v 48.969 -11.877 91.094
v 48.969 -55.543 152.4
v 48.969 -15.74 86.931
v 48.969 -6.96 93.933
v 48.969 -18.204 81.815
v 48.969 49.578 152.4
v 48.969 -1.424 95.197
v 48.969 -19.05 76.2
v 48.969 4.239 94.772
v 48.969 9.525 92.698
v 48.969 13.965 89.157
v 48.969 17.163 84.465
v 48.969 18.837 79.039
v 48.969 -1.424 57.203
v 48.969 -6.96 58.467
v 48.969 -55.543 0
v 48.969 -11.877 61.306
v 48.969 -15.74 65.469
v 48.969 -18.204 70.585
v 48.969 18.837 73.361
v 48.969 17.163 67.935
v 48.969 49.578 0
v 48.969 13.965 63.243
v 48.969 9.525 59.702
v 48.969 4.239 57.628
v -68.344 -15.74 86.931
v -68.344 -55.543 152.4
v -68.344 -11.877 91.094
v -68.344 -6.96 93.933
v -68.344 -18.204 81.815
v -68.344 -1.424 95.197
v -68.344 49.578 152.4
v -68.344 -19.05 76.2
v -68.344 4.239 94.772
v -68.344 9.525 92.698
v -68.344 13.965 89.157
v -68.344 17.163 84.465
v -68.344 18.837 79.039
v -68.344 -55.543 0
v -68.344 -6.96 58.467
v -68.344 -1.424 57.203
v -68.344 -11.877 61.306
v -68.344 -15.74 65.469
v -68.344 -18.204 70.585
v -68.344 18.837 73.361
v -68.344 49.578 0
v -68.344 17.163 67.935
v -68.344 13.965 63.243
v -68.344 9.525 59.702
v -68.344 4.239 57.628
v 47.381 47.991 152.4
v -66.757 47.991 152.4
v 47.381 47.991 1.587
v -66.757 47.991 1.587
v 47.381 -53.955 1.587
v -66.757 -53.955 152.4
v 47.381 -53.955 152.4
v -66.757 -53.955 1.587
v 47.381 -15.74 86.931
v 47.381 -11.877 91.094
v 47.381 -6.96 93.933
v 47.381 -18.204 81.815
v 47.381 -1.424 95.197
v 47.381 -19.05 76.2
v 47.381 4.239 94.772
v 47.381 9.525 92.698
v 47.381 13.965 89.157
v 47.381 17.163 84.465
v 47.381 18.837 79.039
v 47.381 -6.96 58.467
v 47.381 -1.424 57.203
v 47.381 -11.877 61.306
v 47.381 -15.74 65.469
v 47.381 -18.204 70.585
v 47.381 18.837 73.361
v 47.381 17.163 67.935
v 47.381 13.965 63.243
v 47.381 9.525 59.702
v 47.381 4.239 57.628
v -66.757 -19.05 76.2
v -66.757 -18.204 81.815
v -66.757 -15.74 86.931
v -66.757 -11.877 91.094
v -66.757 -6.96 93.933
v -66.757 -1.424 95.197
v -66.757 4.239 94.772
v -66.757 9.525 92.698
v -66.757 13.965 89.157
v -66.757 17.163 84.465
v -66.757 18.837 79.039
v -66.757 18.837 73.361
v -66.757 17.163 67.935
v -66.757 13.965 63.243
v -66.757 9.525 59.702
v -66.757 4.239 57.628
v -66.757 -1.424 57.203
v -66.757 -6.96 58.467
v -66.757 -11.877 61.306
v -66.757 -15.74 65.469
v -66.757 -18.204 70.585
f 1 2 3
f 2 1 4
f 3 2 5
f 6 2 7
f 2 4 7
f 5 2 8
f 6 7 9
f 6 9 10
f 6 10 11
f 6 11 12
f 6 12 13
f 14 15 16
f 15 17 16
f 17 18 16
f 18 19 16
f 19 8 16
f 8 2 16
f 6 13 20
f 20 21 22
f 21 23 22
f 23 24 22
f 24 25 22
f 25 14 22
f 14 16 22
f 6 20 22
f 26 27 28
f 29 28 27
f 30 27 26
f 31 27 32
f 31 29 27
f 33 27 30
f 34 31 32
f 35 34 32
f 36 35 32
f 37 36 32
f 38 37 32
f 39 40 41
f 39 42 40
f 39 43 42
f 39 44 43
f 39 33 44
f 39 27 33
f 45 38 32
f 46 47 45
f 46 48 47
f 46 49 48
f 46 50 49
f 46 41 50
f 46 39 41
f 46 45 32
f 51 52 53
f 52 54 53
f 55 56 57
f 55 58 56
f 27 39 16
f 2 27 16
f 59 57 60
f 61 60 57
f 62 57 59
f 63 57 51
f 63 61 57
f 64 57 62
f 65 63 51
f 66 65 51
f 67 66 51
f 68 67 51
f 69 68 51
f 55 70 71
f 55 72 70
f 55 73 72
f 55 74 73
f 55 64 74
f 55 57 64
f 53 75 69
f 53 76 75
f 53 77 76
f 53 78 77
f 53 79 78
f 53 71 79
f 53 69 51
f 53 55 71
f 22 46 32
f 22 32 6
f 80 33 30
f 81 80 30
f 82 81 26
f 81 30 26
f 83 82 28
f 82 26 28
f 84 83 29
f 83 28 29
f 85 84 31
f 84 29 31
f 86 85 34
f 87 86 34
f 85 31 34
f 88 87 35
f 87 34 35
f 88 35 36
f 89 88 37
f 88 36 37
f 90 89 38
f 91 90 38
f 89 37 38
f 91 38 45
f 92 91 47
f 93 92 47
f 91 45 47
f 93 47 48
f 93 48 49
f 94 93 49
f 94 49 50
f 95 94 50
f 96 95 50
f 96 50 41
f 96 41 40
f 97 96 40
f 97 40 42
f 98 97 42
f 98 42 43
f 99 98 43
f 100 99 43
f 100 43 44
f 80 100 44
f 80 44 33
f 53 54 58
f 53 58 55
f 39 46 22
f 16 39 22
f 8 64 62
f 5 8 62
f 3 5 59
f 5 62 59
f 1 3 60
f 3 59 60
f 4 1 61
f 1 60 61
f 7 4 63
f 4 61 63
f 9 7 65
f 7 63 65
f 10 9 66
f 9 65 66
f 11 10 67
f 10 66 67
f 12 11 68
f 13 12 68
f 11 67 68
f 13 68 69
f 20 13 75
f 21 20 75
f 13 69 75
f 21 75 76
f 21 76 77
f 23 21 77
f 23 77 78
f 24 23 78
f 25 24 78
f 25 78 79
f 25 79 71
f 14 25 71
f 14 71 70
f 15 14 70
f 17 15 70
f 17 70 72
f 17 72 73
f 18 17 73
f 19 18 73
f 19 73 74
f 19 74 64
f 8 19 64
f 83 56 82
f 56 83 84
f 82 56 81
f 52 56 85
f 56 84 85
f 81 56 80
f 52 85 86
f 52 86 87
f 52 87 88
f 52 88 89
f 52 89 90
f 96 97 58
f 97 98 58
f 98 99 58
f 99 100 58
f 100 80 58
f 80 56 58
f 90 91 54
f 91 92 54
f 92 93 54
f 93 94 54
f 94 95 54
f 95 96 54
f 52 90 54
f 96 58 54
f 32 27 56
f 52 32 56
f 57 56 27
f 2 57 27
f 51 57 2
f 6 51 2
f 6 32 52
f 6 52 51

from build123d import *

# Parameters (mm, degrees)
F0_W     = 117.313064
F0_H     = 105.121065
F1_DEPTH = 152.4
F2_T     = -1.5875
F4_D     = 38.1


with BuildPart() as f1:
    # F0 (on Top) → F1 (new body)
    with BuildSketch(Plane.XY):
        with Locations((-9.687949, -2.982347)):
            Rectangle(F0_W, F0_H)
    extrude(amount=F1_DEPTH)

    # F2
    f2_openings = [f1.faces().sort_by_distance(p)[0] for p in [
        (-9.687949, -2.982346, 152.4),
    ]]
    offset(amount=F2_T, openings=f2_openings)

    # F4 (through all)
    with Locations(Plane.YZ.offset(48.968583)):
        with Locations((0, 76.2)):
            Hole(F4_D / 2)


solid = f1.part
